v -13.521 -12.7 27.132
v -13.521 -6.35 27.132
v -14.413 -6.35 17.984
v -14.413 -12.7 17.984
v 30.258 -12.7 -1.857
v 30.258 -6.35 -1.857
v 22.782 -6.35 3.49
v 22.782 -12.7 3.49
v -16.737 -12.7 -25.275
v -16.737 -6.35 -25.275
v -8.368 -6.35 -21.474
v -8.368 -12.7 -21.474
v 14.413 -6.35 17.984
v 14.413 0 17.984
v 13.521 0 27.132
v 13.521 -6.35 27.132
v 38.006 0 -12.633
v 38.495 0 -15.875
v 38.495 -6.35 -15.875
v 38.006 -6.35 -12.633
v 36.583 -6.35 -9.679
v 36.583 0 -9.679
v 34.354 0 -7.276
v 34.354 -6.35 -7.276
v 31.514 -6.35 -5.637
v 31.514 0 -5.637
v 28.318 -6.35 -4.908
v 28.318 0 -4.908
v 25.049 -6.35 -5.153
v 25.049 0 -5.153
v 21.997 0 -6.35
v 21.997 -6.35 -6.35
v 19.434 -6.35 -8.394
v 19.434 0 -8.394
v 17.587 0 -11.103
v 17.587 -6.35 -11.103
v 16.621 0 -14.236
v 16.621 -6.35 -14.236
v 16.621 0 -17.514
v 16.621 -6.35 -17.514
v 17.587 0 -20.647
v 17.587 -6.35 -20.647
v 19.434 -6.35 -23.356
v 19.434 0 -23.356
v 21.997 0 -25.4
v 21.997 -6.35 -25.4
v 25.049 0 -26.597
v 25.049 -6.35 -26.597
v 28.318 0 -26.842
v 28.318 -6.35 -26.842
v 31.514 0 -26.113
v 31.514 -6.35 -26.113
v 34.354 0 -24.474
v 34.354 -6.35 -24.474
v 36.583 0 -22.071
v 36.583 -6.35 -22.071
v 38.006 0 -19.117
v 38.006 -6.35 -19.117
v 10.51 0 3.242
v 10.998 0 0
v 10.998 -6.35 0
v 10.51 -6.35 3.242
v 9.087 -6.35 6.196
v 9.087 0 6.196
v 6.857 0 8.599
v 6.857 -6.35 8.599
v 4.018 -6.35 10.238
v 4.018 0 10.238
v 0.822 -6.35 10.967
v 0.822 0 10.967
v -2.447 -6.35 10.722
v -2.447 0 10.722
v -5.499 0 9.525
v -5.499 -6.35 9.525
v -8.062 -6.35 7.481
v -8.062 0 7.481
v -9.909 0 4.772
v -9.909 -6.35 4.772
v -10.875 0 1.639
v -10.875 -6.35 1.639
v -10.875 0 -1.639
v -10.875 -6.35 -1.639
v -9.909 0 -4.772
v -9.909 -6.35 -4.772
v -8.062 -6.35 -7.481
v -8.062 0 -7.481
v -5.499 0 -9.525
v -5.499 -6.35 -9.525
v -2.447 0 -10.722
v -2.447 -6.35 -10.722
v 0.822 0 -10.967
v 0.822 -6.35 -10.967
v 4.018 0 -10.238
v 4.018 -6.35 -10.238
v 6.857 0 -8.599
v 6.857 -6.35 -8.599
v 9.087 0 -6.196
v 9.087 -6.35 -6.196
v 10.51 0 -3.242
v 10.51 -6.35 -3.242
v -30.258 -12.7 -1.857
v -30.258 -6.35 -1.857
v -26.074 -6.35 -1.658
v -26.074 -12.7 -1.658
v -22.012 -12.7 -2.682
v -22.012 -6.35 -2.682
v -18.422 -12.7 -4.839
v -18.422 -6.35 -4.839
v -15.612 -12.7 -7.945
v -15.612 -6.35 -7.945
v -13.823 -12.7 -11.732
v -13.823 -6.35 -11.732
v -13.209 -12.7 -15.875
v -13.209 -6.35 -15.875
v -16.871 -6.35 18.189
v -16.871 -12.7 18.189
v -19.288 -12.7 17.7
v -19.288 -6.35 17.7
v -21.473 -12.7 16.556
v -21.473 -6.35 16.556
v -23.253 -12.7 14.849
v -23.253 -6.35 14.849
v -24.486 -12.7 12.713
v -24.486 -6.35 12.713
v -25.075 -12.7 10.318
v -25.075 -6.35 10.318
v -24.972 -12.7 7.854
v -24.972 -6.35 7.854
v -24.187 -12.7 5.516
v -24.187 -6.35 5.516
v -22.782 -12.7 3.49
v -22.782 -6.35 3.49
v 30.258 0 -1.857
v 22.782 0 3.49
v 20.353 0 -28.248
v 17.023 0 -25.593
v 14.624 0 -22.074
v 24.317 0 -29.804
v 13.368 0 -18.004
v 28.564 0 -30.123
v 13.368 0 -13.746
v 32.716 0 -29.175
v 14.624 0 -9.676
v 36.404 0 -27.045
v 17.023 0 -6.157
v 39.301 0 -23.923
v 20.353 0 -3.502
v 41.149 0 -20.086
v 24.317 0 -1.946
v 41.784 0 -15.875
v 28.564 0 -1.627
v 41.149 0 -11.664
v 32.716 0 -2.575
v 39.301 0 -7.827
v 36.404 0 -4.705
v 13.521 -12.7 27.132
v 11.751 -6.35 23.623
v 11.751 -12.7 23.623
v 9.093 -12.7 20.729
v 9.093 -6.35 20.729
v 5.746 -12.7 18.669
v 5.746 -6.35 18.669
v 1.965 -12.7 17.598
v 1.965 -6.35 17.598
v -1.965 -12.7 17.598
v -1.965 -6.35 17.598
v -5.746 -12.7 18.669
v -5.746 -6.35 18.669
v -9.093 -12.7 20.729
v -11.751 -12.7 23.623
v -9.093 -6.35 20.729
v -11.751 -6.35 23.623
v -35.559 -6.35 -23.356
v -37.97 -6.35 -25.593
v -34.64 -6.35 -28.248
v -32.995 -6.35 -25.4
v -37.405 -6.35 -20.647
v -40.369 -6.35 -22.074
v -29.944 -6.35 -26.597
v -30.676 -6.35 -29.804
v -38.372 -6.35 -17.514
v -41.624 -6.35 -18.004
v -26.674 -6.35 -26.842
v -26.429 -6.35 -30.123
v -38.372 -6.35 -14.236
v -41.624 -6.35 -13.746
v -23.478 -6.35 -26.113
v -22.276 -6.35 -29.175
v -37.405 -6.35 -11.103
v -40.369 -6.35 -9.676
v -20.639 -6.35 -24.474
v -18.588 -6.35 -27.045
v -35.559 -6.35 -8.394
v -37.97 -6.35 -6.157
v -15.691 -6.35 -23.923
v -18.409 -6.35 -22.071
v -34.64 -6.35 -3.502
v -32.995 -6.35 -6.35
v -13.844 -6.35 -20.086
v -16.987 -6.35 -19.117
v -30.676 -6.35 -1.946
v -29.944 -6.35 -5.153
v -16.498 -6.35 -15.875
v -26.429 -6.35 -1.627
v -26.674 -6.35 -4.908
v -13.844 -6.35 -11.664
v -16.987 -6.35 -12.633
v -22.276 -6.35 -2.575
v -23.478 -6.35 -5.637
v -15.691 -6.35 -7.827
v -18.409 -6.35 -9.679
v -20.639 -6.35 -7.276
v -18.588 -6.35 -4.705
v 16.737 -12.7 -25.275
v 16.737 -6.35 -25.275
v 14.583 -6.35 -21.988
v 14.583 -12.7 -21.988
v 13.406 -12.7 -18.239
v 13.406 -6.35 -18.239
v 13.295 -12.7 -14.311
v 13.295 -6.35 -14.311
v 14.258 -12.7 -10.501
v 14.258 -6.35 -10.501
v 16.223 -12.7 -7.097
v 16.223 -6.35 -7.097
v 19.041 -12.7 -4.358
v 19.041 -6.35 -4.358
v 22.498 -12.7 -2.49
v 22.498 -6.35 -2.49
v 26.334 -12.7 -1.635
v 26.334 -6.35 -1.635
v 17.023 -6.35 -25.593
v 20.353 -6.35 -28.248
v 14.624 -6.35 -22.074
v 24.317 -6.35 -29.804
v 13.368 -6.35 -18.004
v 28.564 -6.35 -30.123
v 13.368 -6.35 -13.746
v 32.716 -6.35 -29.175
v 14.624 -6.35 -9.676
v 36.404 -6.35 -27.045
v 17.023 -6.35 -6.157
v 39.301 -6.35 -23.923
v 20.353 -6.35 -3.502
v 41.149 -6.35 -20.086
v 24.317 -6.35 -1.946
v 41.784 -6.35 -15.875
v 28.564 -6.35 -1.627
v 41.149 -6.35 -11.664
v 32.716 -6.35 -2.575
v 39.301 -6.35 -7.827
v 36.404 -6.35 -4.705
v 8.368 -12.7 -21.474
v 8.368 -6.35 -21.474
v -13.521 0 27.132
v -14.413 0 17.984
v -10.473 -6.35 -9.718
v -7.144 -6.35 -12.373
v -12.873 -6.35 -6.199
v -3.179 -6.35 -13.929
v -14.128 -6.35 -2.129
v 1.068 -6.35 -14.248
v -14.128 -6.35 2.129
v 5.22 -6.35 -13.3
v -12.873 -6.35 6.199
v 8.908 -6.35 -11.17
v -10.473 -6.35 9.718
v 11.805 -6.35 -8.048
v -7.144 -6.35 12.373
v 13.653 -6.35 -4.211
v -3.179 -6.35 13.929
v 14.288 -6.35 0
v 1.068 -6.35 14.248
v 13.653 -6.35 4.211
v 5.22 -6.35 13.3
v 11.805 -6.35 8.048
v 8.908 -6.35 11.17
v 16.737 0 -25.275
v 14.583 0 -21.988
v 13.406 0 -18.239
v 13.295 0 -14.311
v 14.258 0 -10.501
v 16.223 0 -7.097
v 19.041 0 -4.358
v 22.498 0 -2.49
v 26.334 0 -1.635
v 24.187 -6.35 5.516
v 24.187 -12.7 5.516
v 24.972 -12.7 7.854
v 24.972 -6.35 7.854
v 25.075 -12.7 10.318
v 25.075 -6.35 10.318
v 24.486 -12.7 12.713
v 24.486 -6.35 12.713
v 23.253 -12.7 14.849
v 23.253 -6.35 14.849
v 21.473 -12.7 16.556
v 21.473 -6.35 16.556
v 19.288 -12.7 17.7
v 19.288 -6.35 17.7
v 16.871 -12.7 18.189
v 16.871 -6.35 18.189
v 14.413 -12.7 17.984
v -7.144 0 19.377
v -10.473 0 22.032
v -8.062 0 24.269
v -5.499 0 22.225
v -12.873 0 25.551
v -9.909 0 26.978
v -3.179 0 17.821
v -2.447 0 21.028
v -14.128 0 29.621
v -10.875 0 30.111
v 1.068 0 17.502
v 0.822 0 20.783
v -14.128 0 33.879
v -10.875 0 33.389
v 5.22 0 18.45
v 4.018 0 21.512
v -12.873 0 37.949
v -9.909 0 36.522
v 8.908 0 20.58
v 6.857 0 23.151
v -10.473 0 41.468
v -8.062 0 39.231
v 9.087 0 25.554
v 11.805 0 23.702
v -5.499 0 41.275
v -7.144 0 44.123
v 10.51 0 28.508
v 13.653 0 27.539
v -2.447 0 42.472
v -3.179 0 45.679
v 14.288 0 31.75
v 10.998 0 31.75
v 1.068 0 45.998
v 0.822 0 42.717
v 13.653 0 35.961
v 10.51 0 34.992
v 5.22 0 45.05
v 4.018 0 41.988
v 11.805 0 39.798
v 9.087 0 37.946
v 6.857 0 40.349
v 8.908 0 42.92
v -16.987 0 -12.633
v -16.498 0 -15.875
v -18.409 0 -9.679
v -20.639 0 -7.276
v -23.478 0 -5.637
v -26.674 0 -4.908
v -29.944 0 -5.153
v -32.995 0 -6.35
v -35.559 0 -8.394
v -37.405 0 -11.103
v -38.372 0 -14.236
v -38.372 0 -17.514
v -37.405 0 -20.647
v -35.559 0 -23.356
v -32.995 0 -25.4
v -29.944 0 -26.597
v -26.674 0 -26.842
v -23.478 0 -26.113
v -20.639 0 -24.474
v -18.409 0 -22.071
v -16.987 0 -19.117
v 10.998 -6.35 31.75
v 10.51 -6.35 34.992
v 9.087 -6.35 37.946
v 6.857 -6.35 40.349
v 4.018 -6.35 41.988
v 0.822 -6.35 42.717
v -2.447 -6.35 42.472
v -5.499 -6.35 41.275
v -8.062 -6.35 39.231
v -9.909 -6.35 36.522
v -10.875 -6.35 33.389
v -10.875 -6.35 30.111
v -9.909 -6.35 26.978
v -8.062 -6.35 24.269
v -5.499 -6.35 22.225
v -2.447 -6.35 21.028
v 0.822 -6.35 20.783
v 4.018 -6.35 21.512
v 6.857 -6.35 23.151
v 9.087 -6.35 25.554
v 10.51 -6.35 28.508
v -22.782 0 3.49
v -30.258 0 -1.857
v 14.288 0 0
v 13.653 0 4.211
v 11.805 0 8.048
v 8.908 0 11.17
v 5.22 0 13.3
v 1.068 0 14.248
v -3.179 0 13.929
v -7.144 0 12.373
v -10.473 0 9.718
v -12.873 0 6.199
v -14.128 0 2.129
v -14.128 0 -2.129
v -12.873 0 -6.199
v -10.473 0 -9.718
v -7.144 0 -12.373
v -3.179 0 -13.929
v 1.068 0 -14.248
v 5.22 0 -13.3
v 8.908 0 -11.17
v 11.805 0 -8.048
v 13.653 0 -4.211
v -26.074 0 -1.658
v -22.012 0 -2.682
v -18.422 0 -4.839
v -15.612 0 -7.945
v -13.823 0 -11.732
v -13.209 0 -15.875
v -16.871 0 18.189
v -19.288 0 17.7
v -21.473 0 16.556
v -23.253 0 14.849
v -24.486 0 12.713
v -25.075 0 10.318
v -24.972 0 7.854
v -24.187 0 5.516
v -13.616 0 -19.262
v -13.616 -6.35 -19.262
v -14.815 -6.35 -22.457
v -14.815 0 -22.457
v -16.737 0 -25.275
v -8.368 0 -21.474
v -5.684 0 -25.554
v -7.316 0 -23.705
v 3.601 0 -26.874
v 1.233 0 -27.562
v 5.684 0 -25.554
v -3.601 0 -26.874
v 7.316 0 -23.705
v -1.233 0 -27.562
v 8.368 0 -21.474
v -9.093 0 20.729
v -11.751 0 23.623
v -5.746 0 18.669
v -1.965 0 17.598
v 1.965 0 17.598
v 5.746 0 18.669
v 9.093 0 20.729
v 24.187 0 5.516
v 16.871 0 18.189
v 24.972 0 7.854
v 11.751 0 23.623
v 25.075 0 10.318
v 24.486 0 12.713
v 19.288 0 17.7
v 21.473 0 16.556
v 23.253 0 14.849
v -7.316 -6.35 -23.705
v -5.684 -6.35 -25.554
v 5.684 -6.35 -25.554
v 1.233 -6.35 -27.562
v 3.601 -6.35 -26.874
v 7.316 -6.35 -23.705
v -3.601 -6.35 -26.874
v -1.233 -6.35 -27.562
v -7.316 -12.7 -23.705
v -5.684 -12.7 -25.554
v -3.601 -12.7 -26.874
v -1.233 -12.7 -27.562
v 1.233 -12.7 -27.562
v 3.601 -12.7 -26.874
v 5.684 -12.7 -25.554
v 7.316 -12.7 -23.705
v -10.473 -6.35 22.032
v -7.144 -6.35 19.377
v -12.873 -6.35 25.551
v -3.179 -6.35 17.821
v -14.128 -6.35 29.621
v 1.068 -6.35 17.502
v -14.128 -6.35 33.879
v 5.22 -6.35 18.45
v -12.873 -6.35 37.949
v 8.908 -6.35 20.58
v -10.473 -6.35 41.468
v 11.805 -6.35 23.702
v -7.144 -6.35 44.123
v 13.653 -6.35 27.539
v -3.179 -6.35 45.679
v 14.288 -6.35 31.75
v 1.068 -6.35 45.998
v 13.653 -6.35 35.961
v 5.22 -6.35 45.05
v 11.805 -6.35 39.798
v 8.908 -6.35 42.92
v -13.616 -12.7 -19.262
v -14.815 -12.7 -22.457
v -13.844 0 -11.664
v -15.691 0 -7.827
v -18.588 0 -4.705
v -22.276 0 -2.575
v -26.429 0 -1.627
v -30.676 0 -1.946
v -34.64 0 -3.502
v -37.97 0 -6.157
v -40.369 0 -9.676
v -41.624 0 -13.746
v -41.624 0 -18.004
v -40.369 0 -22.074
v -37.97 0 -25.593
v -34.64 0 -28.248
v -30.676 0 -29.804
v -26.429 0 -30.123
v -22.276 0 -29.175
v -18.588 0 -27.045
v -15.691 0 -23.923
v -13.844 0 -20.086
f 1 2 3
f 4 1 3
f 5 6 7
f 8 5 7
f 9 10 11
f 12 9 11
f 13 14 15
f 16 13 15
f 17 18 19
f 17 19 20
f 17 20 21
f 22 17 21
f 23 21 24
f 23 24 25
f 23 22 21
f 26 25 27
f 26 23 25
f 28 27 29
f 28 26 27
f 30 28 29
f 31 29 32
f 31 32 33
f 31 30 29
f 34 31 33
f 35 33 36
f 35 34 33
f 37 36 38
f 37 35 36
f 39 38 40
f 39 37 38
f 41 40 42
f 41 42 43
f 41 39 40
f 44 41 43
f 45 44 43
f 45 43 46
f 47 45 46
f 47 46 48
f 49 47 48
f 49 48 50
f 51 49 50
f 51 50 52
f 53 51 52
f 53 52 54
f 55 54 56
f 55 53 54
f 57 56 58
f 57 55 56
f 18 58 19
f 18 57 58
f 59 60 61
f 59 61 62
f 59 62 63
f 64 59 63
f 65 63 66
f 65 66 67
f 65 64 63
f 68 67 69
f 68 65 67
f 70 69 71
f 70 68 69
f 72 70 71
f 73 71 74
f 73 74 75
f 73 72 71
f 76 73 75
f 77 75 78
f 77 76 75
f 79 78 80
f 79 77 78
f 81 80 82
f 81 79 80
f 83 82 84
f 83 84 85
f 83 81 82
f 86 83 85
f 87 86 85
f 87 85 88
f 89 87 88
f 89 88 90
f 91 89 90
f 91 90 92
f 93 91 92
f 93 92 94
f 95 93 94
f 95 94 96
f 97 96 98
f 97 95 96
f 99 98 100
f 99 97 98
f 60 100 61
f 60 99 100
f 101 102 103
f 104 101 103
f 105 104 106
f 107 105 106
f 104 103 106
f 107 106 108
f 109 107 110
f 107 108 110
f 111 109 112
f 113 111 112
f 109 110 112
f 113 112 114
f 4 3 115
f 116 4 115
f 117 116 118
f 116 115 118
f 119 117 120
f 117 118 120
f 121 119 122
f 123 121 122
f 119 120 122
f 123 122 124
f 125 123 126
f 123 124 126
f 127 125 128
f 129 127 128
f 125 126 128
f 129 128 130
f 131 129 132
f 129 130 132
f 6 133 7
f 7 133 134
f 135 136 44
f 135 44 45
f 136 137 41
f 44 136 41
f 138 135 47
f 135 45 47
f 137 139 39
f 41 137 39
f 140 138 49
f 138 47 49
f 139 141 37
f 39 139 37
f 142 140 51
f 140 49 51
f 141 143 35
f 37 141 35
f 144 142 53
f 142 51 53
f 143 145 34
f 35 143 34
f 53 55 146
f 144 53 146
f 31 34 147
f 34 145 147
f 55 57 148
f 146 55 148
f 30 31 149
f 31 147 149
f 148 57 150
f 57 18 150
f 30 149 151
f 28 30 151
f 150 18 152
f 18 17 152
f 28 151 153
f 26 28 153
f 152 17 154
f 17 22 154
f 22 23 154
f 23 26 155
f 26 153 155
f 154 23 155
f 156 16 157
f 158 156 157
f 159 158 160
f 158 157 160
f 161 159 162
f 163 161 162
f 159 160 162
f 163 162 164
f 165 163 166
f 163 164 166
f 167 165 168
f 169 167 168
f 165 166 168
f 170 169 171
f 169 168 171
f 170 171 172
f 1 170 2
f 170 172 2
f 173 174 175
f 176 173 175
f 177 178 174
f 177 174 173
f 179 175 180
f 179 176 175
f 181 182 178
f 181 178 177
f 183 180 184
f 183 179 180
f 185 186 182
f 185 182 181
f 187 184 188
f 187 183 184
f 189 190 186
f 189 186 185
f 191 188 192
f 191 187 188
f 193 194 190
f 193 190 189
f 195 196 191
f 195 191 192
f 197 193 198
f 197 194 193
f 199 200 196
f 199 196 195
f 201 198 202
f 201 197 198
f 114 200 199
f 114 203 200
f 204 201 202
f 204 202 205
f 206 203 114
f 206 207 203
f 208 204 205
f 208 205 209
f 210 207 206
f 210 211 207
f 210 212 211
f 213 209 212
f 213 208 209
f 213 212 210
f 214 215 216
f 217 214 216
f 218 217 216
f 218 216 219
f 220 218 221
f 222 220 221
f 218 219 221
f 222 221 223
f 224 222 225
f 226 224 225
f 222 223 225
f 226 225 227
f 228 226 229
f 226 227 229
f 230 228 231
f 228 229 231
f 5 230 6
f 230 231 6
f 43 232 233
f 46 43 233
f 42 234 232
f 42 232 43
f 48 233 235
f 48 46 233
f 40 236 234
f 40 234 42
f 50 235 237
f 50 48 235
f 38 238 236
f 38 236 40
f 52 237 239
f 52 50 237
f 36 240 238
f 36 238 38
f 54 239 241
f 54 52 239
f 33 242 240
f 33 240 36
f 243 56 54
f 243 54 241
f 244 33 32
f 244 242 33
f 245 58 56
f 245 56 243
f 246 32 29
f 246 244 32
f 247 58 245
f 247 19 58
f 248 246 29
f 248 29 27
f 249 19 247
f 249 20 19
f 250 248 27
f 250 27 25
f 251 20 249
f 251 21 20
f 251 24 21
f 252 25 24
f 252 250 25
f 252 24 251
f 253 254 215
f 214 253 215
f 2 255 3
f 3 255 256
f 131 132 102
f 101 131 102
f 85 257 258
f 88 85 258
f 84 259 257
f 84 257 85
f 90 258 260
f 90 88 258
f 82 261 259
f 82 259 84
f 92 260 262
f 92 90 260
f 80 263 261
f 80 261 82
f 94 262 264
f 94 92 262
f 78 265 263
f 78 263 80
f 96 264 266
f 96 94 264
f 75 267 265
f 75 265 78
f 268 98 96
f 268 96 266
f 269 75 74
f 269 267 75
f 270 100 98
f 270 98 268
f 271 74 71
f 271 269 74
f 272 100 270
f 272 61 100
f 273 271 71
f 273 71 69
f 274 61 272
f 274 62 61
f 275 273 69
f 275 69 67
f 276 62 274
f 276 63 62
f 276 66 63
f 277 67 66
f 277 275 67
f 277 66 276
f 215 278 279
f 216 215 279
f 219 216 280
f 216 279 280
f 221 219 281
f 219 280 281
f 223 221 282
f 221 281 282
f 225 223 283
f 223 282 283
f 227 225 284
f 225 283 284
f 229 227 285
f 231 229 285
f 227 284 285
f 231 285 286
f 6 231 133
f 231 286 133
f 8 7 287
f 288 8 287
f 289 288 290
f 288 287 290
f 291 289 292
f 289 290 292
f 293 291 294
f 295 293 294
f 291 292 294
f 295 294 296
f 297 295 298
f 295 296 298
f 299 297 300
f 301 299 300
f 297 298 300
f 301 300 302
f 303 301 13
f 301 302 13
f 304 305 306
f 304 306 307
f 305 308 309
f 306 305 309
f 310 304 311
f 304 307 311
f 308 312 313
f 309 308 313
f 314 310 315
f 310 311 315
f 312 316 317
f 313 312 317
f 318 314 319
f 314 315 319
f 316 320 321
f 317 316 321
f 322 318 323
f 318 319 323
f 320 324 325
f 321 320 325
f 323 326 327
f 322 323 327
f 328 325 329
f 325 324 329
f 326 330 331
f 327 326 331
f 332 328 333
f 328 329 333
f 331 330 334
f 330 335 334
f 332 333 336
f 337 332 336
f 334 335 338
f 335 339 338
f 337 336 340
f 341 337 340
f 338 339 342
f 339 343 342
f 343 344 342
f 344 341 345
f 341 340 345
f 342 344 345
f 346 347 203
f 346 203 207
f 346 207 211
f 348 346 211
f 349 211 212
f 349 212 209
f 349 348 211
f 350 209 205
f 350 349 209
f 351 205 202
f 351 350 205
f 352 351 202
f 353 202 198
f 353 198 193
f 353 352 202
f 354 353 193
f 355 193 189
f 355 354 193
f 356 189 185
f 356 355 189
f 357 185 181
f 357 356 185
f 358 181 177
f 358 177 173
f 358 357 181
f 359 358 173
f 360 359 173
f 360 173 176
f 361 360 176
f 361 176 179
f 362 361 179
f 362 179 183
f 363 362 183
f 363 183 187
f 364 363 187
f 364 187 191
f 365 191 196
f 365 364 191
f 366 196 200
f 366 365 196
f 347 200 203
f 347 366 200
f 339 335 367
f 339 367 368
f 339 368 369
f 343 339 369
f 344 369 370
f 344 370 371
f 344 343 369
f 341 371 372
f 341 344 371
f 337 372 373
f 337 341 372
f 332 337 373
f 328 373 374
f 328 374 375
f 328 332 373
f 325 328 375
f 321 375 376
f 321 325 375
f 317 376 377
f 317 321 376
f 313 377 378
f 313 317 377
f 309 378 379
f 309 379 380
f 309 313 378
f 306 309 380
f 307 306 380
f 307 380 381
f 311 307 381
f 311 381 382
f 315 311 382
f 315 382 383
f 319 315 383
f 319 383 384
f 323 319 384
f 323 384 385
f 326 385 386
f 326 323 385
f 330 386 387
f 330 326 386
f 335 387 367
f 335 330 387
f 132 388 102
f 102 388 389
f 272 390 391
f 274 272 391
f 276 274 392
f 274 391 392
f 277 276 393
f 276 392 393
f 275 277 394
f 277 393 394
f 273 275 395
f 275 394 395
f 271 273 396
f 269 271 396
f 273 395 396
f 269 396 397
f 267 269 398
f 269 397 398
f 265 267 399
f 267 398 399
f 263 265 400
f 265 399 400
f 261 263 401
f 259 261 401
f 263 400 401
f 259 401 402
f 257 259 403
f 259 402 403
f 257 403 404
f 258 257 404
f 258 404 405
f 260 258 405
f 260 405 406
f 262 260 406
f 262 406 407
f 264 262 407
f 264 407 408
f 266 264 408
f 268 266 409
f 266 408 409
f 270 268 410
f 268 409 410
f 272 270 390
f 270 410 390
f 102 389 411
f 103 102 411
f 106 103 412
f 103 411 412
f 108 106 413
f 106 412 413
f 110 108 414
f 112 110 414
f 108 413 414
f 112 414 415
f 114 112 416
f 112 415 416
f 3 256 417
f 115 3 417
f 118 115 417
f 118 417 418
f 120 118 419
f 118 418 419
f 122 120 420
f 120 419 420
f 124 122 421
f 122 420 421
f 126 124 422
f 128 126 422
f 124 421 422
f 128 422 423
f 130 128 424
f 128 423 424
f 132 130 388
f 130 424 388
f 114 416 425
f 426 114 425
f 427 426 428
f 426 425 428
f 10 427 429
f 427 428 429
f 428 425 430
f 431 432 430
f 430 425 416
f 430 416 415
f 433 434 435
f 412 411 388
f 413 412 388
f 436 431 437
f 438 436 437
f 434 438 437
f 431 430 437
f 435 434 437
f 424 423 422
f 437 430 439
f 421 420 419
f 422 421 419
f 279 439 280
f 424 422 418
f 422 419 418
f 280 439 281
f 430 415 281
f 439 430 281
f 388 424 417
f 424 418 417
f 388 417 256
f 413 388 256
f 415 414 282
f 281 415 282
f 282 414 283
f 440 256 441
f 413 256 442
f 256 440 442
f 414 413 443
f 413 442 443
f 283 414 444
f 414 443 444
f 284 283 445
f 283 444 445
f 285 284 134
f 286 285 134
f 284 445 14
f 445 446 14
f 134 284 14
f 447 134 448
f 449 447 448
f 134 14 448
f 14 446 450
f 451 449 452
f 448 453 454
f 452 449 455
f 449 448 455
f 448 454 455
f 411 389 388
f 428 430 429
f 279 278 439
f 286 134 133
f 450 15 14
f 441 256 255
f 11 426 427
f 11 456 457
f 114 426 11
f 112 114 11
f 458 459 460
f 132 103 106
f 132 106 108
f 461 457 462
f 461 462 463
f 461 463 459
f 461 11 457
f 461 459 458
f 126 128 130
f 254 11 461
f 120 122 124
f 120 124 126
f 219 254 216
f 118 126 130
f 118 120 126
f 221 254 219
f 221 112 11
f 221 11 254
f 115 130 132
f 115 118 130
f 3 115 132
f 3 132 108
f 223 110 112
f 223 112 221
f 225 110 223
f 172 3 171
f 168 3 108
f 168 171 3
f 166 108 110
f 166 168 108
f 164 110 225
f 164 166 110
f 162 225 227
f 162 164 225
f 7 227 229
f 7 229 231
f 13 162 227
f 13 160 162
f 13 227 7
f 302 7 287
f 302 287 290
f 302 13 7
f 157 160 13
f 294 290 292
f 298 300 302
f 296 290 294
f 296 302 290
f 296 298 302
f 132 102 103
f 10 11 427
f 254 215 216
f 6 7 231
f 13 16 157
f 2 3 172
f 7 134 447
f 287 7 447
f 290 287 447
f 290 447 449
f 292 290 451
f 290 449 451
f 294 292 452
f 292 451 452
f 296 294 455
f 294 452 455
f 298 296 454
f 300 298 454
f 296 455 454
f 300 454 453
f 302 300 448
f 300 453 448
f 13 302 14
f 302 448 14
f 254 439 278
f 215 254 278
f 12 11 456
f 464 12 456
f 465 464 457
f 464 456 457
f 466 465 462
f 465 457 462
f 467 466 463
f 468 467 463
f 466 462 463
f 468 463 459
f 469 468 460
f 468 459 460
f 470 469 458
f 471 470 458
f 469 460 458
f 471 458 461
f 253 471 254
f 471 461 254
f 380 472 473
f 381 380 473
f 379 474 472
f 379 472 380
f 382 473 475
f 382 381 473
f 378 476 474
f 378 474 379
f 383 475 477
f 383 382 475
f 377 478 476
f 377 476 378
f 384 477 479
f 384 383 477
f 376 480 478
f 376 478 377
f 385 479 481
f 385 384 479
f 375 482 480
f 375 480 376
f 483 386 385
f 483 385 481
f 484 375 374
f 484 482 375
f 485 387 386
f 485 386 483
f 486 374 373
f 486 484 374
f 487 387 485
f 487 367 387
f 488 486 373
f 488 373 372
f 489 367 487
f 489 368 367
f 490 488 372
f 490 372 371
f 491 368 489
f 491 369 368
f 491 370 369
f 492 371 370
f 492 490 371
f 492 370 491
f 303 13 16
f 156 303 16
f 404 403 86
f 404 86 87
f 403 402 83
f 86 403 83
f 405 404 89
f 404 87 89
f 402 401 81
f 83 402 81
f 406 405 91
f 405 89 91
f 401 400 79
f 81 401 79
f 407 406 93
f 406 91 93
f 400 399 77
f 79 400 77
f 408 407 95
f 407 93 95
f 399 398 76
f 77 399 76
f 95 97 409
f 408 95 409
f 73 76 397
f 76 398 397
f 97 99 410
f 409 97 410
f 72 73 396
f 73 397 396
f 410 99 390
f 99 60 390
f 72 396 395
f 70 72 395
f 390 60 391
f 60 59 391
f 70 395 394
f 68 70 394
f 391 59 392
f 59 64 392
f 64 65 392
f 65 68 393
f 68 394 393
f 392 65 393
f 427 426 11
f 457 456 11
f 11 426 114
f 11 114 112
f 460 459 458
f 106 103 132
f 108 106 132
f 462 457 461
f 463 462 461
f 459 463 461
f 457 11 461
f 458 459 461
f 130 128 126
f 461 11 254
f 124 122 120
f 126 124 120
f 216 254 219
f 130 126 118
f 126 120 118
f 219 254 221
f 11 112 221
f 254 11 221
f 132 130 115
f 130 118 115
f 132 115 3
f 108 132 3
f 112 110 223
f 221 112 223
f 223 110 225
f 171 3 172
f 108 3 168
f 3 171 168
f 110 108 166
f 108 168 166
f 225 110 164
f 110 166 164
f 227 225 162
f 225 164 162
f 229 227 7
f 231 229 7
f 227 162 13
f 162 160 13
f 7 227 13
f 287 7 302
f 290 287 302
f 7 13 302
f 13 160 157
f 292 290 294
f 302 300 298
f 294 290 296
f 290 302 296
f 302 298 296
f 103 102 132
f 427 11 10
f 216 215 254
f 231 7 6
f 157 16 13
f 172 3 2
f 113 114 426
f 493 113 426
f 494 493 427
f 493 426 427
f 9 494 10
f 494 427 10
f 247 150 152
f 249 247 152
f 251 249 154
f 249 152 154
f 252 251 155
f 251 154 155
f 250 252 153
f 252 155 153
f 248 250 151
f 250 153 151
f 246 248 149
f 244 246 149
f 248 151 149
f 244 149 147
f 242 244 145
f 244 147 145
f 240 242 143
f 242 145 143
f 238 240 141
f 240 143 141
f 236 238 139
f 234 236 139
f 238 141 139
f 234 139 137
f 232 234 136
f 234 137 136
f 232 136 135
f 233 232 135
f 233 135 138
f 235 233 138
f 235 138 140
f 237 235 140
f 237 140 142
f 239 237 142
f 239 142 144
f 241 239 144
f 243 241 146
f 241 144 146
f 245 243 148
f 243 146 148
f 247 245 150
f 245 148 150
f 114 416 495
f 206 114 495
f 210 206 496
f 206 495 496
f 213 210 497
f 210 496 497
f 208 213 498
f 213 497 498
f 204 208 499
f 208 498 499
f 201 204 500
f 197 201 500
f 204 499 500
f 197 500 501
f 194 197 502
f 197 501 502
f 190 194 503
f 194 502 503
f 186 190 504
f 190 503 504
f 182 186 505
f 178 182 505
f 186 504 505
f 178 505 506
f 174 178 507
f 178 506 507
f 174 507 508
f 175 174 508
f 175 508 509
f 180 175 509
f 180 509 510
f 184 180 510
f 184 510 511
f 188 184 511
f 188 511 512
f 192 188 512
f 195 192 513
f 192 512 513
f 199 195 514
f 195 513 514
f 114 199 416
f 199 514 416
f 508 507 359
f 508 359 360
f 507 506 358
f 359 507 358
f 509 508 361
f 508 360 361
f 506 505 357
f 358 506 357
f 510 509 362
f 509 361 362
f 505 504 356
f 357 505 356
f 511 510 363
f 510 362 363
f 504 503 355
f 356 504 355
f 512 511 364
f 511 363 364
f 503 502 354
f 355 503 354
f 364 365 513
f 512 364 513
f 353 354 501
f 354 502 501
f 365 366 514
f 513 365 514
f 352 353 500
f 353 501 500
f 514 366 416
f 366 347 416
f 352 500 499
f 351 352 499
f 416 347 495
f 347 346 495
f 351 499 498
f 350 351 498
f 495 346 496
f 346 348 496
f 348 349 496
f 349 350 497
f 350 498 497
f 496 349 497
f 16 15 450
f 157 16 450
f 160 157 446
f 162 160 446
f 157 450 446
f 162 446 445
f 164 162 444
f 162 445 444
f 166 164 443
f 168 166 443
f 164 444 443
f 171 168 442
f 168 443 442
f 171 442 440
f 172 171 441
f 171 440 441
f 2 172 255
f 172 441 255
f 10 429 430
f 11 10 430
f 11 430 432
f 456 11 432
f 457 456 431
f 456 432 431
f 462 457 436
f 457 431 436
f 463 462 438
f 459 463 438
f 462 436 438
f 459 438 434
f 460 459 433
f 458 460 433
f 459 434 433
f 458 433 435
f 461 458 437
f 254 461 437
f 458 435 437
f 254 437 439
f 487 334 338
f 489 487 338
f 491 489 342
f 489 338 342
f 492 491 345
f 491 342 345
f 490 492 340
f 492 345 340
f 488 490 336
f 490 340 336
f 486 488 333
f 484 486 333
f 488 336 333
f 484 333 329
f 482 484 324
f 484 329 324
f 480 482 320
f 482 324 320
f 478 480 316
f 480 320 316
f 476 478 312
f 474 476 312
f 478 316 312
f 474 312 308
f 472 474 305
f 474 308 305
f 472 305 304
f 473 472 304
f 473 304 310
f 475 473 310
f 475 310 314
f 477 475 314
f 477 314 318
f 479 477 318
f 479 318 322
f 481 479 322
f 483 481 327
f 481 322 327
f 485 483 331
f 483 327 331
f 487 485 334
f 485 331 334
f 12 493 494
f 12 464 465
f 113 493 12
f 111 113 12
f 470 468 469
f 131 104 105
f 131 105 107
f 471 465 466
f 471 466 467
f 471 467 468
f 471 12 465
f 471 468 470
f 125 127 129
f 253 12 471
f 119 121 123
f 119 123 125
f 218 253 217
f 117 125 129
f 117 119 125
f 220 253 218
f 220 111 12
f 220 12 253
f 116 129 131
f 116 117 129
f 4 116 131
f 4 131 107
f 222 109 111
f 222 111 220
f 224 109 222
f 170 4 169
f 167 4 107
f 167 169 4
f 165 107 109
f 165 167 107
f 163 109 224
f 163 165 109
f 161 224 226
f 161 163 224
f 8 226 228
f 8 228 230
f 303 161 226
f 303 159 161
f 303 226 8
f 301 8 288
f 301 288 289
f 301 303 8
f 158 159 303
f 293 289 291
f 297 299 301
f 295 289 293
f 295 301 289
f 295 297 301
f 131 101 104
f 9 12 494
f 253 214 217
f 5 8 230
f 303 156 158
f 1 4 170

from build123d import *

# Parameters (mm, degrees)
F0_R     = 14.2875
F0_R_2   = 10.9982
F2_DEPTH = 6.35
F1_W     = 0.4390429688
F1_H     = 3.7777539063
F1_R     = 14.2875
F1_W_2   = 0.3297629937
F1_H_2   = 2.8374522002
F5_DEPTH = 6.35
F7_DEPTH = 6.35
F8_DEPTH = 6.35


with BuildPart() as f2:
    # F0 (on Front) → F2 (new body)
    with BuildSketch(Plane.XZ):
        with Locations((0, 31.75)):
            Circle(F0_R)
        with Locations((0, 31.75)):
            Circle(F0_R_2, mode=Mode.SUBTRACT)
    extrude(amount=F2_DEPTH)


with BuildPart() as f2b:
    # F0 (on Front) → F2, piece 2 (new body)
    with BuildSketch(Plane.XZ):
        Circle(F0_R)
        Circle(F0_R_2, mode=Mode.SUBTRACT)
    extrude(amount=F2_DEPTH)


with BuildPart() as f2c:
    # F0 (on Front) → F2, piece 3 (new body)
    with BuildSketch(Plane.XZ):
        with Locations((-27.4963065702, -15.875)):
            Circle(F0_R)
        with Locations((-27.4963065702, -15.875)):
            Circle(F0_R_2, mode=Mode.SUBTRACT)
    extrude(amount=F2_DEPTH)


with BuildPart() as f2d:
    # F0 (on Front) → F2, piece 4 (new body)
    with BuildSketch(Plane.XZ):
        with Locations((27.4963065702, -15.875)):
            Circle(F0_R)
        with Locations((27.4963065702, -15.875)):
            Circle(F0_R_2, mode=Mode.SUBTRACT)
    extrude(amount=F2_DEPTH)


with BuildPart() as f2e:
    # F1 (on Front) → F2, piece 5 (new body)
    with BuildSketch(Plane.XZ):
        with BuildLine():
            ThreePointArc((13.5206938879, 27.1322632123), (0, 17.4625), (-13.5206938879, 27.1322632123))
            ThreePointArc((-13.5206938879, 27.1322632123), (-15.305469781, 8.8366170981), (-30.257576148, -1.8568672225))
            ThreePointArc((-30.257576148, -1.8568672225), (-18.4221394691, -4.8390520266), (-13.2088065702, -15.875))
            ThreePointArc((-13.2088065702, -15.875), (-14.1198733557, -20.8953277493), (-16.7368822601, -25.2753959899))
            ThreePointArc((-16.7368822601, -25.2753959899), (-11.342771298, -20.7856162625), (-4.8176097302, -18.2016616216))
            Line((-4.8176097302, -18.2016616216), (-5.5088278546, -18.2016616216))
            Line((-5.5088278546, -18.2016616216), (-5.5088278546, -14.4239077154))
            Line((-5.5088278546, -14.4239077154), (-3.4029098859, -14.4239077154))
            Line((-3.4029098859, -14.4239077154), (-3.4029098859, -14.814168132))
            Line((-3.4029098859, -14.814168132), (-5.0697848859, -14.814168132))
            Line((-5.0697848859, -14.814168132), (-5.0697848859, -16.0312514654))
            Line((-5.0697848859, -16.0312514654), (-3.5037822817, -16.0312514654))
            Line((-3.5037822817, -16.0312514654), (-3.5037822817, -16.4190314133))
            Line((-3.5037822817, -16.4190314133), (-5.0697848859, -16.4190314133))
            Line((-5.0697848859, -16.4190314133), (-5.0697848859, -17.8089207362))
            Line((-5.0697848859, -17.8089207362), (-3.4029098859, -17.8089207362))
            Line((-3.4029098859, -17.8089207362), (-3.4029098859, -17.9352920139))
            ThreePointArc((-3.4029098859, -17.9352920139), (-2.9850761481, -17.8746117561), (-2.5661650942, -17.821879839))
            Line((-2.5661650942, -17.821879839), (-2.5661650942, -14.4239077154))
            Line((-2.5661650942, -14.4239077154), (-2.0700713442, -14.4239077154))
            Line((-2.0700713442, -14.4239077154), (-0.0104554588, -17.5815444341))
            Line((-0.0104554588, -17.5815444341), (0.0102151141, -17.5815444341))
            add(Edge.make_bspline(
                [(0.0102151141, -17.5815444341), (0.0052541766, -17.5120913091), (-0.0129359276, -17.1334064133)],
                knots=[0, 0, 0, 1, 1, 1], degree=2))
            add(Edge.make_bspline(
                [(-0.0129359276, -17.1334064133), (-0.0311260317, -16.7547215175), (-0.0261650942, -16.5918374029)],
                knots=[0, 0, 0, 1, 1, 1], degree=2))
            Line((-0.0261650942, -16.5918374029), (-0.0261650942, -14.4239077154))
            Line((-0.0261650942, -14.4239077154), (0.3847658954, -14.4239077154))
            Line((0.3847658954, -14.4239077154), (0.3847658954, -17.6765650374))
            ThreePointArc((0.3847658954, -17.6765650374), (0.9042579175, -17.6916373697), (1.4232554787, -17.7188525809))
            Line((1.4232554787, -17.7188525809), (1.4232554787, -14.4239077154))
            Line((1.4232554787, -14.4239077154), (1.9193492287, -14.4239077154))
            Line((1.9193492287, -14.4239077154), (3.9789651141, -17.5815444341))
            Line((3.9789651141, -17.5815444341), (3.999635687, -17.5815444341))
            add(Edge.make_bspline(
                [(3.999635687, -17.5815444341), (3.9946747495, -17.5120913091), (3.9764846454, -17.1334064133)],
                knots=[0, 0, 0, 1, 1, 1], degree=2))
            add(Edge.make_bspline(
                [(3.9764846454, -17.1334064133), (3.9582945412, -16.7547215175), (3.9632554787, -16.5918374029)],
                knots=[0, 0, 0, 1, 1, 1], degree=2))
            Line((3.9632554787, -16.5918374029), (3.9632554787, -14.4239077154))
            Line((3.9632554787, -14.4239077154), (4.3741864683, -14.4239077154))
            Line((4.3741864683, -14.4239077154), (4.3741864683, -18.1079354893))
            ThreePointArc((4.3741864683, -18.1079354893), (11.1473058727, -20.6709567816), (16.7368822601, -25.2753959899))
            ThreePointArc((16.7368822601, -25.2753959899), (15.1229686136, -8.73125), (30.257576148, -1.8568672225))
            ThreePointArc((30.257576148, -1.8568672225), (15.305469781, 8.8366170981), (13.5206938879, 27.1322632123))
        make_face()
        Polygon((-7.2740947817, -14.814168132), (-7.2740947817, -18.2016616216), (-7.7131377505, -18.2016616216), (-7.7131377505, -14.814168132), (-8.9095505109, -14.814168132), (-8.9095505109, -14.4239077154), (-6.0776820213, -14.4239077154), (-6.0776820213, -14.814168132), align=None, mode=Mode.SUBTRACT)
        with Locations((5.632197536, -16.3127846685)):
            Rectangle(F1_W, F1_H, mode=Mode.SUBTRACT)
        with BuildLine():
            add(Edge.make_bspline(
                [(8.7960354266, -16.5662058925), (9.0192776141, -16.80929183), (9.0192776141, -17.196244955)],
                knots=[0, 0, 0, 1, 1, 1], degree=2))
            add(Edge.make_bspline(
                [(9.0192776141, -17.196244955), (9.0192776141, -17.6948191737), (8.6575425881, -17.9742853195)],
                knots=[0, 0, 0, 1, 1, 1], degree=2))
            add(Edge.make_bspline(
                [(8.6575425881, -17.9742853195), (8.295807562, -18.2537514654), (7.6756903745, -18.2537514654)],
                knots=[0, 0, 0, 1, 1, 1], degree=2))
            add(Edge.make_bspline(
                [(7.6756903745, -18.2537514654), (7.0043101662, -18.2537514654), (6.6421617287, -18.0801186529)],
                knots=[0, 0, 0, 1, 1, 1], degree=2))
            Line((6.6421617287, -18.0801186529), (6.6421617287, -17.6567853195))
            add(Edge.make_bspline(
                [(6.6421617287, -17.6567853195), (6.8753257912, -17.7543504237), (7.1490041766, -17.811401205)],
                knots=[0, 0, 0, 1, 1, 1], degree=2))
            add(Edge.make_bspline(
                [(7.1490041766, -17.811401205), (7.422682562, -17.8684519862), (7.6914000099, -17.8684519862)],
                knots=[0, 0, 0, 1, 1, 1], degree=2))
            add(Edge.make_bspline(
                [(7.6914000099, -17.8684519862), (8.1304429787, -17.8684519862), (8.3528583433, -17.7018471685)],
                knots=[0, 0, 0, 1, 1, 1], degree=2))
            add(Edge.make_bspline(
                [(8.3528583433, -17.7018471685), (8.5752737079, -17.5352423508), (8.5752737079, -17.2375861008)],
                knots=[0, 0, 0, 1, 1, 1], degree=2))
            add(Edge.make_bspline(
                [(8.5752737079, -17.2375861008), (8.5752737079, -17.0416290695), (8.4963121193, -16.9163653977)],
                knots=[0, 0, 0, 1, 1, 1], degree=2))
            add(Edge.make_bspline(
                [(8.4963121193, -16.9163653977), (8.4173505308, -16.7911017258), (8.2325556089, -16.684854981)],
                knots=[0, 0, 0, 1, 1, 1], degree=2))
            add(Edge.make_bspline(
                [(8.2325556089, -16.684854981), (8.047760687, -16.5786082362), (7.670729437, -16.4446629237)],
                knots=[0, 0, 0, 1, 1, 1], degree=2))
            add(Edge.make_bspline(
                [(7.670729437, -16.4446629237), (7.1440432391, -16.2561472987), (6.9179071714, -15.9977651373)],
                knots=[0, 0, 0, 1, 1, 1], degree=2))
            add(Edge.make_bspline(
                [(6.9179071714, -15.9977651373), (6.6917711037, -15.7393829758), (6.6917711037, -15.3234910487)],
                knots=[0, 0, 0, 1, 1, 1], degree=2))
            add(Edge.make_bspline(
                [(6.6917711037, -15.3234910487), (6.6917711037, -14.8869285487), (7.0196063901, -14.6285463873)],
                knots=[0, 0, 0, 1, 1, 1], degree=2))
            add(Edge.make_bspline(
                [(7.0196063901, -14.6285463873), (7.3474416766, -14.3701642258), (7.8881838641, -14.3701642258)],
                knots=[0, 0, 0, 1, 1, 1], degree=2))
            add(Edge.make_bspline(
                [(7.8881838641, -14.3701642258), (8.4512502704, -14.3701642258), (8.9241929787, -14.576869955)],
                knots=[0, 0, 0, 1, 1, 1], degree=2))
            Line((8.9241929787, -14.576869955), (8.7869403745, -14.9588621425))
            add(Edge.make_bspline(
                [(8.7869403745, -14.9588621425), (8.3189586037, -14.7629051112), (7.8774351662, -14.7629051112)],
                knots=[0, 0, 0, 1, 1, 1], degree=2))
            add(Edge.make_bspline(
                [(7.8774351662, -14.7629051112), (7.5285158954, -14.7629051112), (7.3321454526, -14.9125600591)],
                knots=[0, 0, 0, 1, 1, 1], degree=2))
            add(Edge.make_bspline(
                [(7.3321454526, -14.9125600591), (7.1357750099, -15.062215007), (7.1357750099, -15.3284519862)],
                knots=[0, 0, 0, 1, 1, 1], degree=2))
            add(Edge.make_bspline(
                [(7.1357750099, -15.3284519862), (7.1357750099, -15.5244090175), (7.2081220151, -15.6500861008)],
                knots=[0, 0, 0, 1, 1, 1], degree=2))
            add(Edge.make_bspline(
                [(7.2081220151, -15.6500861008), (7.2804690204, -15.7757631841), (7.452448187, -15.8803562831)],
                knots=[0, 0, 0, 1, 1, 1], degree=2))
            add(Edge.make_bspline(
                [(7.452448187, -15.8803562831), (7.6244273537, -15.984949382), (7.978307562, -16.1114532883)],
                knots=[0, 0, 0, 1, 1, 1], degree=2))
            add(Edge.make_bspline(
                [(7.978307562, -16.1114532883), (8.5727932391, -16.323119955), (8.7960354266, -16.5662058925)],
                knots=[0, 0, 0, 1, 1, 1], degree=2))
        make_face(mode=Mode.SUBTRACT)
        Circle(F1_R, mode=Mode.SUBTRACT)
        Polygon((-3.553615096, 16.0265346236), (-2.3699460451, 14.4218122587), (-2.758085162, 14.4218122587), (-3.7920877694, 15.7979983115), (-4.0895575886, 15.534063712), (-4.0895575886, 14.4218122587), (-4.4193205823, 14.4218122587), (-4.4193205823, 17.2592644588), (-4.0895575886, 17.2592644588), (-4.0895575886, 15.8520272766), (-2.8027987883, 17.2592644588), (-2.4127966036, 17.2592644588), align=None, mode=Mode.SUBTRACT)
        with Locations((-1.8150623636, 15.8405383587)):
            Rectangle(F1_W_2, F1_H_2, mode=Mode.SUBTRACT)
        Polygon((0.0011181922, 16.9661417977), (0.0011181922, 14.4218122587), (-0.3286448015, 14.4218122587), (-0.3286448015, 16.9661417977), (-1.2272644849, 16.9661417977), (-1.2272644849, 17.2592644588), (0.8997378756, 17.2592644588), (0.8997378756, 16.9661417977), align=None, mode=Mode.SUBTRACT)
        with BuildLine():
            add(Edge.make_bspline(
                [(2.7603215464, 15.6501949358), (2.9279976449, 15.4676142952), (2.9279976449, 15.1769757245)],
                knots=[0, 0, 0, 1, 1, 1], degree=2))
            add(Edge.make_bspline(
                [(2.9279976449, 15.1769757245), (2.9279976449, 14.8024991045), (2.6563002631, 14.5925934701)],
                knots=[0, 0, 0, 1, 1, 1], degree=2))
            add(Edge.make_bspline(
                [(2.6563002631, 14.5925934701), (2.3846028812, 14.3826878357), (1.918835941, 14.3826878357)],
                knots=[0, 0, 0, 1, 1, 1], degree=2))
            add(Edge.make_bspline(
                [(1.918835941, 14.3826878357), (1.4145656003, 14.3826878357), (1.1425577072, 14.513102579)],
                knots=[0, 0, 0, 1, 1, 1], degree=2))
            Line((1.1425577072, 14.513102579), (1.1425577072, 14.8310661435))
            add(Edge.make_bspline(
                [(1.1425577072, 14.8310661435), (1.3176860767, 14.7577854782), (1.523244553, 14.7149349197)],
                knots=[0, 0, 0, 1, 1, 1], degree=2))
            add(Edge.make_bspline(
                [(1.523244553, 14.7149349197), (1.7288030293, 14.6720843612), (1.9306353701, 14.6720843612)],
                knots=[0, 0, 0, 1, 1, 1], degree=2))
            add(Edge.make_bspline(
                [(1.9306353701, 14.6720843612), (2.2603983638, 14.6720843612), (2.4274534397, 14.7972204125)],
                knots=[0, 0, 0, 1, 1, 1], degree=2))
            add(Edge.make_bspline(
                [(2.4274534397, 14.7972204125), (2.5945085157, 14.9223564638), (2.5945085157, 15.1459245951)],
                knots=[0, 0, 0, 1, 1, 1], degree=2))
            add(Edge.make_bspline(
                [(2.5945085157, 15.1459245951), (2.5945085157, 15.2931069483), (2.5352008586, 15.3871918702)],
                knots=[0, 0, 0, 1, 1, 1], degree=2))
            add(Edge.make_bspline(
                [(2.5352008586, 15.3871918702), (2.4758932015, 15.4812767921), (2.3370946533, 15.5610781946)],
                knots=[0, 0, 0, 1, 1, 1], degree=2))
            add(Edge.make_bspline(
                [(2.3370946533, 15.5610781946), (2.1982961051, 15.640879597), (1.9151098054, 15.7414852561)],
                knots=[0, 0, 0, 1, 1, 1], degree=2))
            add(Edge.make_bspline(
                [(1.9151098054, 15.7414852561), (1.5195184175, 15.883078406), (1.34966874, 16.0771479644)],
                knots=[0, 0, 0, 1, 1, 1], degree=2))
            add(Edge.make_bspline(
                [(1.34966874, 16.0771479644), (1.1798190624, 16.2712175228), (1.1798190624, 16.5835918841)],
                knots=[0, 0, 0, 1, 1, 1], degree=2))
            add(Edge.make_bspline(
                [(1.1798190624, 16.5835918841), (1.1798190624, 16.9114918101), (1.4260545182, 17.1055613685)],
                knots=[0, 0, 0, 1, 1, 1], degree=2))
            add(Edge.make_bspline(
                [(1.4260545182, 17.1055613685), (1.6722899739, 17.299630927), (2.0784387458, 17.299630927)],
                knots=[0, 0, 0, 1, 1, 1], degree=2))
            add(Edge.make_bspline(
                [(2.0784387458, 17.299630927), (2.5013551276, 17.299630927), (2.8565800474, 17.1443752802)],
                knots=[0, 0, 0, 1, 1, 1], degree=2))
            Line((2.8565800474, 17.1443752802), (2.7534902979, 16.857462845))
            add(Edge.make_bspline(
                [(2.7534902979, 16.857462845), (2.4019915137, 17.0046451981), (2.0703654522, 17.0046451981)],
                knots=[0, 0, 0, 1, 1, 1], degree=2))
            add(Edge.make_bspline(
                [(2.0703654522, 17.0046451981), (1.8082939205, 17.0046451981), (1.6608010561, 16.8922401099)],
                knots=[0, 0, 0, 1, 1, 1], degree=2))
            add(Edge.make_bspline(
                [(1.6608010561, 16.8922401099), (1.5133081916, 16.7798350216), (1.5133081916, 16.5798657486)],
                knots=[0, 0, 0, 1, 1, 1], degree=2))
            add(Edge.make_bspline(
                [(1.5133081916, 16.5798657486), (1.5133081916, 16.4326833955), (1.567647668, 16.3382879622)],
                knots=[0, 0, 0, 1, 1, 1], degree=2))
            add(Edge.make_bspline(
                [(1.567647668, 16.3382879622), (1.6219871444, 16.243892529), (1.7511598425, 16.1653331718)],
                knots=[0, 0, 0, 1, 1, 1], degree=2))
            add(Edge.make_bspline(
                [(1.7511598425, 16.1653331718), (1.8803325406, 16.0867738145), (2.1461302078, 15.9917573587)],
                knots=[0, 0, 0, 1, 1, 1], degree=2))
            add(Edge.make_bspline(
                [(2.1461302078, 15.9917573587), (2.5926454479, 15.8327755764), (2.7603215464, 15.6501949358)],
                knots=[0, 0, 0, 1, 1, 1], degree=2))
        make_face(mode=Mode.SUBTRACT)
        Polygon((5.6337930566, 14.4218122587), (5.2922306337, 14.4218122587), (4.9388687817, 15.3241580776), (3.8017764249, 15.3241580776), (3.4527617309, 14.4218122587), (3.1186515791, 14.4218122587), (4.2402183713, 17.271063888), (4.5178154677, 17.271063888), align=None, mode=Mode.SUBTRACT)
    extrude(amount=F2_DEPTH)

    # F4 (on Front) → F5 (join)
    with BuildSketch(Plane.XZ):
        with BuildLine():
            ThreePointArc((-15.305469781, 8.8366170981), (-12.4328863407, 17.7912682301), (-13.5206938879, 27.1322632123))
            Line((-13.5206938879, 27.1322632123), (-15.305469781, 8.8366170981))
        make_face()
        with BuildLine():
            ThreePointArc((-30.257576148, -1.8568672225), (-21.6241334232, 1.8715612984), (-15.305469781, 8.8366170981))
            Line((-15.305469781, 8.8366170981), (-30.257576148, -1.8568672225))
        make_face()
        with BuildLine():
            Line((15.305469781, 8.8366170981), (13.5206938879, 27.1322632123))
            ThreePointArc((13.5206938879, 27.1322632123), (12.4328863407, 17.7912682301), (15.305469781, 8.8366170981))
        make_face()
        with BuildLine():
            Line((30.257576148, -1.8568672225), (15.305469781, 8.8366170981))
            ThreePointArc((15.305469781, 8.8366170981), (21.6241334232, 1.8715612984), (30.257576148, -1.8568672225))
        make_face()
        with BuildLine():
            ThreePointArc((13.5206938879, 27.1322632123), (0, 17.4625), (-13.5206938879, 27.1322632123))
            ThreePointArc((-13.5206938879, 27.1322632123), (-12.4328863407, 17.7912682301), (-15.305469781, 8.8366170981))
            ThreePointArc((-15.305469781, 8.8366170981), (-21.6241334232, 1.8715612984), (-30.257576148, -1.8568672225))
            ThreePointArc((-30.257576148, -1.8568672225), (-18.4221394691, -4.8390520266), (-13.2088065702, -15.875))
            ThreePointArc((-13.2088065702, -15.875), (-14.1198733557, -20.8953277493), (-16.7368822601, -25.2753959899))
            Line((-16.7368822601, -25.2753959899), (0, -17.6732341963))
            Line((0, -17.6732341963), (16.7368822601, -25.2753959899))
            ThreePointArc((16.7368822601, -25.2753959899), (15.1229686136, -8.73125), (30.257576148, -1.8568672225))
            ThreePointArc((30.257576148, -1.8568672225), (21.6241334232, 1.8715612984), (15.305469781, 8.8366170981))
            ThreePointArc((15.305469781, 8.8366170981), (12.4328863407, 17.7912682301), (13.5206938879, 27.1322632123))
        make_face()
    extrude(amount=F5_DEPTH)

    # F6 (on Front) → F7 (join)
    with BuildSketch(Plane.XZ):
        with BuildLine():
            Line((-15.305469781, 8.8366170981), (-14.4130818345, 17.9844401552))
            ThreePointArc((-14.4130818345, 17.9844401552), (-23.9447381252, 13.8245010023), (-22.7815229645, 3.4898749378))
            Line((-22.7815229645, 3.4898749378), (-15.305469781, 8.8366170981))
        make_face()
        with BuildLine():
            ThreePointArc((22.7815229645, 3.4898749378), (23.9447381252, 13.8245010023), (14.4130818345, 17.9844401552))
            Line((14.4130818345, 17.9844401552), (15.305469781, 8.8366170981))
            Line((15.305469781, 8.8366170981), (22.7815229645, 3.4898749378))
        make_face()
        with BuildLine():
            Line((0, -17.6732341963), (-8.36844113, -21.4743150931))
            ThreePointArc((-8.36844113, -21.4743150931), (0, -27.6490020045), (8.36844113, -21.4743150931))
            Line((8.36844113, -21.4743150931), (0, -17.6732341963))
        make_face()
    extrude(amount=F7_DEPTH)


with BuildPart() as f8:
    # F8 (new): a face of the model
    f8_faces = [f2e.part.faces().sort_by_distance(p)[0] for p in [
        (0, -6.35, 0),
    ]]
    extrude(f8_faces, amount=F8_DEPTH)


solid = Compound([f2.part, f2b.part, f2c.part, f2d.part, f2e.part, f8.part])
